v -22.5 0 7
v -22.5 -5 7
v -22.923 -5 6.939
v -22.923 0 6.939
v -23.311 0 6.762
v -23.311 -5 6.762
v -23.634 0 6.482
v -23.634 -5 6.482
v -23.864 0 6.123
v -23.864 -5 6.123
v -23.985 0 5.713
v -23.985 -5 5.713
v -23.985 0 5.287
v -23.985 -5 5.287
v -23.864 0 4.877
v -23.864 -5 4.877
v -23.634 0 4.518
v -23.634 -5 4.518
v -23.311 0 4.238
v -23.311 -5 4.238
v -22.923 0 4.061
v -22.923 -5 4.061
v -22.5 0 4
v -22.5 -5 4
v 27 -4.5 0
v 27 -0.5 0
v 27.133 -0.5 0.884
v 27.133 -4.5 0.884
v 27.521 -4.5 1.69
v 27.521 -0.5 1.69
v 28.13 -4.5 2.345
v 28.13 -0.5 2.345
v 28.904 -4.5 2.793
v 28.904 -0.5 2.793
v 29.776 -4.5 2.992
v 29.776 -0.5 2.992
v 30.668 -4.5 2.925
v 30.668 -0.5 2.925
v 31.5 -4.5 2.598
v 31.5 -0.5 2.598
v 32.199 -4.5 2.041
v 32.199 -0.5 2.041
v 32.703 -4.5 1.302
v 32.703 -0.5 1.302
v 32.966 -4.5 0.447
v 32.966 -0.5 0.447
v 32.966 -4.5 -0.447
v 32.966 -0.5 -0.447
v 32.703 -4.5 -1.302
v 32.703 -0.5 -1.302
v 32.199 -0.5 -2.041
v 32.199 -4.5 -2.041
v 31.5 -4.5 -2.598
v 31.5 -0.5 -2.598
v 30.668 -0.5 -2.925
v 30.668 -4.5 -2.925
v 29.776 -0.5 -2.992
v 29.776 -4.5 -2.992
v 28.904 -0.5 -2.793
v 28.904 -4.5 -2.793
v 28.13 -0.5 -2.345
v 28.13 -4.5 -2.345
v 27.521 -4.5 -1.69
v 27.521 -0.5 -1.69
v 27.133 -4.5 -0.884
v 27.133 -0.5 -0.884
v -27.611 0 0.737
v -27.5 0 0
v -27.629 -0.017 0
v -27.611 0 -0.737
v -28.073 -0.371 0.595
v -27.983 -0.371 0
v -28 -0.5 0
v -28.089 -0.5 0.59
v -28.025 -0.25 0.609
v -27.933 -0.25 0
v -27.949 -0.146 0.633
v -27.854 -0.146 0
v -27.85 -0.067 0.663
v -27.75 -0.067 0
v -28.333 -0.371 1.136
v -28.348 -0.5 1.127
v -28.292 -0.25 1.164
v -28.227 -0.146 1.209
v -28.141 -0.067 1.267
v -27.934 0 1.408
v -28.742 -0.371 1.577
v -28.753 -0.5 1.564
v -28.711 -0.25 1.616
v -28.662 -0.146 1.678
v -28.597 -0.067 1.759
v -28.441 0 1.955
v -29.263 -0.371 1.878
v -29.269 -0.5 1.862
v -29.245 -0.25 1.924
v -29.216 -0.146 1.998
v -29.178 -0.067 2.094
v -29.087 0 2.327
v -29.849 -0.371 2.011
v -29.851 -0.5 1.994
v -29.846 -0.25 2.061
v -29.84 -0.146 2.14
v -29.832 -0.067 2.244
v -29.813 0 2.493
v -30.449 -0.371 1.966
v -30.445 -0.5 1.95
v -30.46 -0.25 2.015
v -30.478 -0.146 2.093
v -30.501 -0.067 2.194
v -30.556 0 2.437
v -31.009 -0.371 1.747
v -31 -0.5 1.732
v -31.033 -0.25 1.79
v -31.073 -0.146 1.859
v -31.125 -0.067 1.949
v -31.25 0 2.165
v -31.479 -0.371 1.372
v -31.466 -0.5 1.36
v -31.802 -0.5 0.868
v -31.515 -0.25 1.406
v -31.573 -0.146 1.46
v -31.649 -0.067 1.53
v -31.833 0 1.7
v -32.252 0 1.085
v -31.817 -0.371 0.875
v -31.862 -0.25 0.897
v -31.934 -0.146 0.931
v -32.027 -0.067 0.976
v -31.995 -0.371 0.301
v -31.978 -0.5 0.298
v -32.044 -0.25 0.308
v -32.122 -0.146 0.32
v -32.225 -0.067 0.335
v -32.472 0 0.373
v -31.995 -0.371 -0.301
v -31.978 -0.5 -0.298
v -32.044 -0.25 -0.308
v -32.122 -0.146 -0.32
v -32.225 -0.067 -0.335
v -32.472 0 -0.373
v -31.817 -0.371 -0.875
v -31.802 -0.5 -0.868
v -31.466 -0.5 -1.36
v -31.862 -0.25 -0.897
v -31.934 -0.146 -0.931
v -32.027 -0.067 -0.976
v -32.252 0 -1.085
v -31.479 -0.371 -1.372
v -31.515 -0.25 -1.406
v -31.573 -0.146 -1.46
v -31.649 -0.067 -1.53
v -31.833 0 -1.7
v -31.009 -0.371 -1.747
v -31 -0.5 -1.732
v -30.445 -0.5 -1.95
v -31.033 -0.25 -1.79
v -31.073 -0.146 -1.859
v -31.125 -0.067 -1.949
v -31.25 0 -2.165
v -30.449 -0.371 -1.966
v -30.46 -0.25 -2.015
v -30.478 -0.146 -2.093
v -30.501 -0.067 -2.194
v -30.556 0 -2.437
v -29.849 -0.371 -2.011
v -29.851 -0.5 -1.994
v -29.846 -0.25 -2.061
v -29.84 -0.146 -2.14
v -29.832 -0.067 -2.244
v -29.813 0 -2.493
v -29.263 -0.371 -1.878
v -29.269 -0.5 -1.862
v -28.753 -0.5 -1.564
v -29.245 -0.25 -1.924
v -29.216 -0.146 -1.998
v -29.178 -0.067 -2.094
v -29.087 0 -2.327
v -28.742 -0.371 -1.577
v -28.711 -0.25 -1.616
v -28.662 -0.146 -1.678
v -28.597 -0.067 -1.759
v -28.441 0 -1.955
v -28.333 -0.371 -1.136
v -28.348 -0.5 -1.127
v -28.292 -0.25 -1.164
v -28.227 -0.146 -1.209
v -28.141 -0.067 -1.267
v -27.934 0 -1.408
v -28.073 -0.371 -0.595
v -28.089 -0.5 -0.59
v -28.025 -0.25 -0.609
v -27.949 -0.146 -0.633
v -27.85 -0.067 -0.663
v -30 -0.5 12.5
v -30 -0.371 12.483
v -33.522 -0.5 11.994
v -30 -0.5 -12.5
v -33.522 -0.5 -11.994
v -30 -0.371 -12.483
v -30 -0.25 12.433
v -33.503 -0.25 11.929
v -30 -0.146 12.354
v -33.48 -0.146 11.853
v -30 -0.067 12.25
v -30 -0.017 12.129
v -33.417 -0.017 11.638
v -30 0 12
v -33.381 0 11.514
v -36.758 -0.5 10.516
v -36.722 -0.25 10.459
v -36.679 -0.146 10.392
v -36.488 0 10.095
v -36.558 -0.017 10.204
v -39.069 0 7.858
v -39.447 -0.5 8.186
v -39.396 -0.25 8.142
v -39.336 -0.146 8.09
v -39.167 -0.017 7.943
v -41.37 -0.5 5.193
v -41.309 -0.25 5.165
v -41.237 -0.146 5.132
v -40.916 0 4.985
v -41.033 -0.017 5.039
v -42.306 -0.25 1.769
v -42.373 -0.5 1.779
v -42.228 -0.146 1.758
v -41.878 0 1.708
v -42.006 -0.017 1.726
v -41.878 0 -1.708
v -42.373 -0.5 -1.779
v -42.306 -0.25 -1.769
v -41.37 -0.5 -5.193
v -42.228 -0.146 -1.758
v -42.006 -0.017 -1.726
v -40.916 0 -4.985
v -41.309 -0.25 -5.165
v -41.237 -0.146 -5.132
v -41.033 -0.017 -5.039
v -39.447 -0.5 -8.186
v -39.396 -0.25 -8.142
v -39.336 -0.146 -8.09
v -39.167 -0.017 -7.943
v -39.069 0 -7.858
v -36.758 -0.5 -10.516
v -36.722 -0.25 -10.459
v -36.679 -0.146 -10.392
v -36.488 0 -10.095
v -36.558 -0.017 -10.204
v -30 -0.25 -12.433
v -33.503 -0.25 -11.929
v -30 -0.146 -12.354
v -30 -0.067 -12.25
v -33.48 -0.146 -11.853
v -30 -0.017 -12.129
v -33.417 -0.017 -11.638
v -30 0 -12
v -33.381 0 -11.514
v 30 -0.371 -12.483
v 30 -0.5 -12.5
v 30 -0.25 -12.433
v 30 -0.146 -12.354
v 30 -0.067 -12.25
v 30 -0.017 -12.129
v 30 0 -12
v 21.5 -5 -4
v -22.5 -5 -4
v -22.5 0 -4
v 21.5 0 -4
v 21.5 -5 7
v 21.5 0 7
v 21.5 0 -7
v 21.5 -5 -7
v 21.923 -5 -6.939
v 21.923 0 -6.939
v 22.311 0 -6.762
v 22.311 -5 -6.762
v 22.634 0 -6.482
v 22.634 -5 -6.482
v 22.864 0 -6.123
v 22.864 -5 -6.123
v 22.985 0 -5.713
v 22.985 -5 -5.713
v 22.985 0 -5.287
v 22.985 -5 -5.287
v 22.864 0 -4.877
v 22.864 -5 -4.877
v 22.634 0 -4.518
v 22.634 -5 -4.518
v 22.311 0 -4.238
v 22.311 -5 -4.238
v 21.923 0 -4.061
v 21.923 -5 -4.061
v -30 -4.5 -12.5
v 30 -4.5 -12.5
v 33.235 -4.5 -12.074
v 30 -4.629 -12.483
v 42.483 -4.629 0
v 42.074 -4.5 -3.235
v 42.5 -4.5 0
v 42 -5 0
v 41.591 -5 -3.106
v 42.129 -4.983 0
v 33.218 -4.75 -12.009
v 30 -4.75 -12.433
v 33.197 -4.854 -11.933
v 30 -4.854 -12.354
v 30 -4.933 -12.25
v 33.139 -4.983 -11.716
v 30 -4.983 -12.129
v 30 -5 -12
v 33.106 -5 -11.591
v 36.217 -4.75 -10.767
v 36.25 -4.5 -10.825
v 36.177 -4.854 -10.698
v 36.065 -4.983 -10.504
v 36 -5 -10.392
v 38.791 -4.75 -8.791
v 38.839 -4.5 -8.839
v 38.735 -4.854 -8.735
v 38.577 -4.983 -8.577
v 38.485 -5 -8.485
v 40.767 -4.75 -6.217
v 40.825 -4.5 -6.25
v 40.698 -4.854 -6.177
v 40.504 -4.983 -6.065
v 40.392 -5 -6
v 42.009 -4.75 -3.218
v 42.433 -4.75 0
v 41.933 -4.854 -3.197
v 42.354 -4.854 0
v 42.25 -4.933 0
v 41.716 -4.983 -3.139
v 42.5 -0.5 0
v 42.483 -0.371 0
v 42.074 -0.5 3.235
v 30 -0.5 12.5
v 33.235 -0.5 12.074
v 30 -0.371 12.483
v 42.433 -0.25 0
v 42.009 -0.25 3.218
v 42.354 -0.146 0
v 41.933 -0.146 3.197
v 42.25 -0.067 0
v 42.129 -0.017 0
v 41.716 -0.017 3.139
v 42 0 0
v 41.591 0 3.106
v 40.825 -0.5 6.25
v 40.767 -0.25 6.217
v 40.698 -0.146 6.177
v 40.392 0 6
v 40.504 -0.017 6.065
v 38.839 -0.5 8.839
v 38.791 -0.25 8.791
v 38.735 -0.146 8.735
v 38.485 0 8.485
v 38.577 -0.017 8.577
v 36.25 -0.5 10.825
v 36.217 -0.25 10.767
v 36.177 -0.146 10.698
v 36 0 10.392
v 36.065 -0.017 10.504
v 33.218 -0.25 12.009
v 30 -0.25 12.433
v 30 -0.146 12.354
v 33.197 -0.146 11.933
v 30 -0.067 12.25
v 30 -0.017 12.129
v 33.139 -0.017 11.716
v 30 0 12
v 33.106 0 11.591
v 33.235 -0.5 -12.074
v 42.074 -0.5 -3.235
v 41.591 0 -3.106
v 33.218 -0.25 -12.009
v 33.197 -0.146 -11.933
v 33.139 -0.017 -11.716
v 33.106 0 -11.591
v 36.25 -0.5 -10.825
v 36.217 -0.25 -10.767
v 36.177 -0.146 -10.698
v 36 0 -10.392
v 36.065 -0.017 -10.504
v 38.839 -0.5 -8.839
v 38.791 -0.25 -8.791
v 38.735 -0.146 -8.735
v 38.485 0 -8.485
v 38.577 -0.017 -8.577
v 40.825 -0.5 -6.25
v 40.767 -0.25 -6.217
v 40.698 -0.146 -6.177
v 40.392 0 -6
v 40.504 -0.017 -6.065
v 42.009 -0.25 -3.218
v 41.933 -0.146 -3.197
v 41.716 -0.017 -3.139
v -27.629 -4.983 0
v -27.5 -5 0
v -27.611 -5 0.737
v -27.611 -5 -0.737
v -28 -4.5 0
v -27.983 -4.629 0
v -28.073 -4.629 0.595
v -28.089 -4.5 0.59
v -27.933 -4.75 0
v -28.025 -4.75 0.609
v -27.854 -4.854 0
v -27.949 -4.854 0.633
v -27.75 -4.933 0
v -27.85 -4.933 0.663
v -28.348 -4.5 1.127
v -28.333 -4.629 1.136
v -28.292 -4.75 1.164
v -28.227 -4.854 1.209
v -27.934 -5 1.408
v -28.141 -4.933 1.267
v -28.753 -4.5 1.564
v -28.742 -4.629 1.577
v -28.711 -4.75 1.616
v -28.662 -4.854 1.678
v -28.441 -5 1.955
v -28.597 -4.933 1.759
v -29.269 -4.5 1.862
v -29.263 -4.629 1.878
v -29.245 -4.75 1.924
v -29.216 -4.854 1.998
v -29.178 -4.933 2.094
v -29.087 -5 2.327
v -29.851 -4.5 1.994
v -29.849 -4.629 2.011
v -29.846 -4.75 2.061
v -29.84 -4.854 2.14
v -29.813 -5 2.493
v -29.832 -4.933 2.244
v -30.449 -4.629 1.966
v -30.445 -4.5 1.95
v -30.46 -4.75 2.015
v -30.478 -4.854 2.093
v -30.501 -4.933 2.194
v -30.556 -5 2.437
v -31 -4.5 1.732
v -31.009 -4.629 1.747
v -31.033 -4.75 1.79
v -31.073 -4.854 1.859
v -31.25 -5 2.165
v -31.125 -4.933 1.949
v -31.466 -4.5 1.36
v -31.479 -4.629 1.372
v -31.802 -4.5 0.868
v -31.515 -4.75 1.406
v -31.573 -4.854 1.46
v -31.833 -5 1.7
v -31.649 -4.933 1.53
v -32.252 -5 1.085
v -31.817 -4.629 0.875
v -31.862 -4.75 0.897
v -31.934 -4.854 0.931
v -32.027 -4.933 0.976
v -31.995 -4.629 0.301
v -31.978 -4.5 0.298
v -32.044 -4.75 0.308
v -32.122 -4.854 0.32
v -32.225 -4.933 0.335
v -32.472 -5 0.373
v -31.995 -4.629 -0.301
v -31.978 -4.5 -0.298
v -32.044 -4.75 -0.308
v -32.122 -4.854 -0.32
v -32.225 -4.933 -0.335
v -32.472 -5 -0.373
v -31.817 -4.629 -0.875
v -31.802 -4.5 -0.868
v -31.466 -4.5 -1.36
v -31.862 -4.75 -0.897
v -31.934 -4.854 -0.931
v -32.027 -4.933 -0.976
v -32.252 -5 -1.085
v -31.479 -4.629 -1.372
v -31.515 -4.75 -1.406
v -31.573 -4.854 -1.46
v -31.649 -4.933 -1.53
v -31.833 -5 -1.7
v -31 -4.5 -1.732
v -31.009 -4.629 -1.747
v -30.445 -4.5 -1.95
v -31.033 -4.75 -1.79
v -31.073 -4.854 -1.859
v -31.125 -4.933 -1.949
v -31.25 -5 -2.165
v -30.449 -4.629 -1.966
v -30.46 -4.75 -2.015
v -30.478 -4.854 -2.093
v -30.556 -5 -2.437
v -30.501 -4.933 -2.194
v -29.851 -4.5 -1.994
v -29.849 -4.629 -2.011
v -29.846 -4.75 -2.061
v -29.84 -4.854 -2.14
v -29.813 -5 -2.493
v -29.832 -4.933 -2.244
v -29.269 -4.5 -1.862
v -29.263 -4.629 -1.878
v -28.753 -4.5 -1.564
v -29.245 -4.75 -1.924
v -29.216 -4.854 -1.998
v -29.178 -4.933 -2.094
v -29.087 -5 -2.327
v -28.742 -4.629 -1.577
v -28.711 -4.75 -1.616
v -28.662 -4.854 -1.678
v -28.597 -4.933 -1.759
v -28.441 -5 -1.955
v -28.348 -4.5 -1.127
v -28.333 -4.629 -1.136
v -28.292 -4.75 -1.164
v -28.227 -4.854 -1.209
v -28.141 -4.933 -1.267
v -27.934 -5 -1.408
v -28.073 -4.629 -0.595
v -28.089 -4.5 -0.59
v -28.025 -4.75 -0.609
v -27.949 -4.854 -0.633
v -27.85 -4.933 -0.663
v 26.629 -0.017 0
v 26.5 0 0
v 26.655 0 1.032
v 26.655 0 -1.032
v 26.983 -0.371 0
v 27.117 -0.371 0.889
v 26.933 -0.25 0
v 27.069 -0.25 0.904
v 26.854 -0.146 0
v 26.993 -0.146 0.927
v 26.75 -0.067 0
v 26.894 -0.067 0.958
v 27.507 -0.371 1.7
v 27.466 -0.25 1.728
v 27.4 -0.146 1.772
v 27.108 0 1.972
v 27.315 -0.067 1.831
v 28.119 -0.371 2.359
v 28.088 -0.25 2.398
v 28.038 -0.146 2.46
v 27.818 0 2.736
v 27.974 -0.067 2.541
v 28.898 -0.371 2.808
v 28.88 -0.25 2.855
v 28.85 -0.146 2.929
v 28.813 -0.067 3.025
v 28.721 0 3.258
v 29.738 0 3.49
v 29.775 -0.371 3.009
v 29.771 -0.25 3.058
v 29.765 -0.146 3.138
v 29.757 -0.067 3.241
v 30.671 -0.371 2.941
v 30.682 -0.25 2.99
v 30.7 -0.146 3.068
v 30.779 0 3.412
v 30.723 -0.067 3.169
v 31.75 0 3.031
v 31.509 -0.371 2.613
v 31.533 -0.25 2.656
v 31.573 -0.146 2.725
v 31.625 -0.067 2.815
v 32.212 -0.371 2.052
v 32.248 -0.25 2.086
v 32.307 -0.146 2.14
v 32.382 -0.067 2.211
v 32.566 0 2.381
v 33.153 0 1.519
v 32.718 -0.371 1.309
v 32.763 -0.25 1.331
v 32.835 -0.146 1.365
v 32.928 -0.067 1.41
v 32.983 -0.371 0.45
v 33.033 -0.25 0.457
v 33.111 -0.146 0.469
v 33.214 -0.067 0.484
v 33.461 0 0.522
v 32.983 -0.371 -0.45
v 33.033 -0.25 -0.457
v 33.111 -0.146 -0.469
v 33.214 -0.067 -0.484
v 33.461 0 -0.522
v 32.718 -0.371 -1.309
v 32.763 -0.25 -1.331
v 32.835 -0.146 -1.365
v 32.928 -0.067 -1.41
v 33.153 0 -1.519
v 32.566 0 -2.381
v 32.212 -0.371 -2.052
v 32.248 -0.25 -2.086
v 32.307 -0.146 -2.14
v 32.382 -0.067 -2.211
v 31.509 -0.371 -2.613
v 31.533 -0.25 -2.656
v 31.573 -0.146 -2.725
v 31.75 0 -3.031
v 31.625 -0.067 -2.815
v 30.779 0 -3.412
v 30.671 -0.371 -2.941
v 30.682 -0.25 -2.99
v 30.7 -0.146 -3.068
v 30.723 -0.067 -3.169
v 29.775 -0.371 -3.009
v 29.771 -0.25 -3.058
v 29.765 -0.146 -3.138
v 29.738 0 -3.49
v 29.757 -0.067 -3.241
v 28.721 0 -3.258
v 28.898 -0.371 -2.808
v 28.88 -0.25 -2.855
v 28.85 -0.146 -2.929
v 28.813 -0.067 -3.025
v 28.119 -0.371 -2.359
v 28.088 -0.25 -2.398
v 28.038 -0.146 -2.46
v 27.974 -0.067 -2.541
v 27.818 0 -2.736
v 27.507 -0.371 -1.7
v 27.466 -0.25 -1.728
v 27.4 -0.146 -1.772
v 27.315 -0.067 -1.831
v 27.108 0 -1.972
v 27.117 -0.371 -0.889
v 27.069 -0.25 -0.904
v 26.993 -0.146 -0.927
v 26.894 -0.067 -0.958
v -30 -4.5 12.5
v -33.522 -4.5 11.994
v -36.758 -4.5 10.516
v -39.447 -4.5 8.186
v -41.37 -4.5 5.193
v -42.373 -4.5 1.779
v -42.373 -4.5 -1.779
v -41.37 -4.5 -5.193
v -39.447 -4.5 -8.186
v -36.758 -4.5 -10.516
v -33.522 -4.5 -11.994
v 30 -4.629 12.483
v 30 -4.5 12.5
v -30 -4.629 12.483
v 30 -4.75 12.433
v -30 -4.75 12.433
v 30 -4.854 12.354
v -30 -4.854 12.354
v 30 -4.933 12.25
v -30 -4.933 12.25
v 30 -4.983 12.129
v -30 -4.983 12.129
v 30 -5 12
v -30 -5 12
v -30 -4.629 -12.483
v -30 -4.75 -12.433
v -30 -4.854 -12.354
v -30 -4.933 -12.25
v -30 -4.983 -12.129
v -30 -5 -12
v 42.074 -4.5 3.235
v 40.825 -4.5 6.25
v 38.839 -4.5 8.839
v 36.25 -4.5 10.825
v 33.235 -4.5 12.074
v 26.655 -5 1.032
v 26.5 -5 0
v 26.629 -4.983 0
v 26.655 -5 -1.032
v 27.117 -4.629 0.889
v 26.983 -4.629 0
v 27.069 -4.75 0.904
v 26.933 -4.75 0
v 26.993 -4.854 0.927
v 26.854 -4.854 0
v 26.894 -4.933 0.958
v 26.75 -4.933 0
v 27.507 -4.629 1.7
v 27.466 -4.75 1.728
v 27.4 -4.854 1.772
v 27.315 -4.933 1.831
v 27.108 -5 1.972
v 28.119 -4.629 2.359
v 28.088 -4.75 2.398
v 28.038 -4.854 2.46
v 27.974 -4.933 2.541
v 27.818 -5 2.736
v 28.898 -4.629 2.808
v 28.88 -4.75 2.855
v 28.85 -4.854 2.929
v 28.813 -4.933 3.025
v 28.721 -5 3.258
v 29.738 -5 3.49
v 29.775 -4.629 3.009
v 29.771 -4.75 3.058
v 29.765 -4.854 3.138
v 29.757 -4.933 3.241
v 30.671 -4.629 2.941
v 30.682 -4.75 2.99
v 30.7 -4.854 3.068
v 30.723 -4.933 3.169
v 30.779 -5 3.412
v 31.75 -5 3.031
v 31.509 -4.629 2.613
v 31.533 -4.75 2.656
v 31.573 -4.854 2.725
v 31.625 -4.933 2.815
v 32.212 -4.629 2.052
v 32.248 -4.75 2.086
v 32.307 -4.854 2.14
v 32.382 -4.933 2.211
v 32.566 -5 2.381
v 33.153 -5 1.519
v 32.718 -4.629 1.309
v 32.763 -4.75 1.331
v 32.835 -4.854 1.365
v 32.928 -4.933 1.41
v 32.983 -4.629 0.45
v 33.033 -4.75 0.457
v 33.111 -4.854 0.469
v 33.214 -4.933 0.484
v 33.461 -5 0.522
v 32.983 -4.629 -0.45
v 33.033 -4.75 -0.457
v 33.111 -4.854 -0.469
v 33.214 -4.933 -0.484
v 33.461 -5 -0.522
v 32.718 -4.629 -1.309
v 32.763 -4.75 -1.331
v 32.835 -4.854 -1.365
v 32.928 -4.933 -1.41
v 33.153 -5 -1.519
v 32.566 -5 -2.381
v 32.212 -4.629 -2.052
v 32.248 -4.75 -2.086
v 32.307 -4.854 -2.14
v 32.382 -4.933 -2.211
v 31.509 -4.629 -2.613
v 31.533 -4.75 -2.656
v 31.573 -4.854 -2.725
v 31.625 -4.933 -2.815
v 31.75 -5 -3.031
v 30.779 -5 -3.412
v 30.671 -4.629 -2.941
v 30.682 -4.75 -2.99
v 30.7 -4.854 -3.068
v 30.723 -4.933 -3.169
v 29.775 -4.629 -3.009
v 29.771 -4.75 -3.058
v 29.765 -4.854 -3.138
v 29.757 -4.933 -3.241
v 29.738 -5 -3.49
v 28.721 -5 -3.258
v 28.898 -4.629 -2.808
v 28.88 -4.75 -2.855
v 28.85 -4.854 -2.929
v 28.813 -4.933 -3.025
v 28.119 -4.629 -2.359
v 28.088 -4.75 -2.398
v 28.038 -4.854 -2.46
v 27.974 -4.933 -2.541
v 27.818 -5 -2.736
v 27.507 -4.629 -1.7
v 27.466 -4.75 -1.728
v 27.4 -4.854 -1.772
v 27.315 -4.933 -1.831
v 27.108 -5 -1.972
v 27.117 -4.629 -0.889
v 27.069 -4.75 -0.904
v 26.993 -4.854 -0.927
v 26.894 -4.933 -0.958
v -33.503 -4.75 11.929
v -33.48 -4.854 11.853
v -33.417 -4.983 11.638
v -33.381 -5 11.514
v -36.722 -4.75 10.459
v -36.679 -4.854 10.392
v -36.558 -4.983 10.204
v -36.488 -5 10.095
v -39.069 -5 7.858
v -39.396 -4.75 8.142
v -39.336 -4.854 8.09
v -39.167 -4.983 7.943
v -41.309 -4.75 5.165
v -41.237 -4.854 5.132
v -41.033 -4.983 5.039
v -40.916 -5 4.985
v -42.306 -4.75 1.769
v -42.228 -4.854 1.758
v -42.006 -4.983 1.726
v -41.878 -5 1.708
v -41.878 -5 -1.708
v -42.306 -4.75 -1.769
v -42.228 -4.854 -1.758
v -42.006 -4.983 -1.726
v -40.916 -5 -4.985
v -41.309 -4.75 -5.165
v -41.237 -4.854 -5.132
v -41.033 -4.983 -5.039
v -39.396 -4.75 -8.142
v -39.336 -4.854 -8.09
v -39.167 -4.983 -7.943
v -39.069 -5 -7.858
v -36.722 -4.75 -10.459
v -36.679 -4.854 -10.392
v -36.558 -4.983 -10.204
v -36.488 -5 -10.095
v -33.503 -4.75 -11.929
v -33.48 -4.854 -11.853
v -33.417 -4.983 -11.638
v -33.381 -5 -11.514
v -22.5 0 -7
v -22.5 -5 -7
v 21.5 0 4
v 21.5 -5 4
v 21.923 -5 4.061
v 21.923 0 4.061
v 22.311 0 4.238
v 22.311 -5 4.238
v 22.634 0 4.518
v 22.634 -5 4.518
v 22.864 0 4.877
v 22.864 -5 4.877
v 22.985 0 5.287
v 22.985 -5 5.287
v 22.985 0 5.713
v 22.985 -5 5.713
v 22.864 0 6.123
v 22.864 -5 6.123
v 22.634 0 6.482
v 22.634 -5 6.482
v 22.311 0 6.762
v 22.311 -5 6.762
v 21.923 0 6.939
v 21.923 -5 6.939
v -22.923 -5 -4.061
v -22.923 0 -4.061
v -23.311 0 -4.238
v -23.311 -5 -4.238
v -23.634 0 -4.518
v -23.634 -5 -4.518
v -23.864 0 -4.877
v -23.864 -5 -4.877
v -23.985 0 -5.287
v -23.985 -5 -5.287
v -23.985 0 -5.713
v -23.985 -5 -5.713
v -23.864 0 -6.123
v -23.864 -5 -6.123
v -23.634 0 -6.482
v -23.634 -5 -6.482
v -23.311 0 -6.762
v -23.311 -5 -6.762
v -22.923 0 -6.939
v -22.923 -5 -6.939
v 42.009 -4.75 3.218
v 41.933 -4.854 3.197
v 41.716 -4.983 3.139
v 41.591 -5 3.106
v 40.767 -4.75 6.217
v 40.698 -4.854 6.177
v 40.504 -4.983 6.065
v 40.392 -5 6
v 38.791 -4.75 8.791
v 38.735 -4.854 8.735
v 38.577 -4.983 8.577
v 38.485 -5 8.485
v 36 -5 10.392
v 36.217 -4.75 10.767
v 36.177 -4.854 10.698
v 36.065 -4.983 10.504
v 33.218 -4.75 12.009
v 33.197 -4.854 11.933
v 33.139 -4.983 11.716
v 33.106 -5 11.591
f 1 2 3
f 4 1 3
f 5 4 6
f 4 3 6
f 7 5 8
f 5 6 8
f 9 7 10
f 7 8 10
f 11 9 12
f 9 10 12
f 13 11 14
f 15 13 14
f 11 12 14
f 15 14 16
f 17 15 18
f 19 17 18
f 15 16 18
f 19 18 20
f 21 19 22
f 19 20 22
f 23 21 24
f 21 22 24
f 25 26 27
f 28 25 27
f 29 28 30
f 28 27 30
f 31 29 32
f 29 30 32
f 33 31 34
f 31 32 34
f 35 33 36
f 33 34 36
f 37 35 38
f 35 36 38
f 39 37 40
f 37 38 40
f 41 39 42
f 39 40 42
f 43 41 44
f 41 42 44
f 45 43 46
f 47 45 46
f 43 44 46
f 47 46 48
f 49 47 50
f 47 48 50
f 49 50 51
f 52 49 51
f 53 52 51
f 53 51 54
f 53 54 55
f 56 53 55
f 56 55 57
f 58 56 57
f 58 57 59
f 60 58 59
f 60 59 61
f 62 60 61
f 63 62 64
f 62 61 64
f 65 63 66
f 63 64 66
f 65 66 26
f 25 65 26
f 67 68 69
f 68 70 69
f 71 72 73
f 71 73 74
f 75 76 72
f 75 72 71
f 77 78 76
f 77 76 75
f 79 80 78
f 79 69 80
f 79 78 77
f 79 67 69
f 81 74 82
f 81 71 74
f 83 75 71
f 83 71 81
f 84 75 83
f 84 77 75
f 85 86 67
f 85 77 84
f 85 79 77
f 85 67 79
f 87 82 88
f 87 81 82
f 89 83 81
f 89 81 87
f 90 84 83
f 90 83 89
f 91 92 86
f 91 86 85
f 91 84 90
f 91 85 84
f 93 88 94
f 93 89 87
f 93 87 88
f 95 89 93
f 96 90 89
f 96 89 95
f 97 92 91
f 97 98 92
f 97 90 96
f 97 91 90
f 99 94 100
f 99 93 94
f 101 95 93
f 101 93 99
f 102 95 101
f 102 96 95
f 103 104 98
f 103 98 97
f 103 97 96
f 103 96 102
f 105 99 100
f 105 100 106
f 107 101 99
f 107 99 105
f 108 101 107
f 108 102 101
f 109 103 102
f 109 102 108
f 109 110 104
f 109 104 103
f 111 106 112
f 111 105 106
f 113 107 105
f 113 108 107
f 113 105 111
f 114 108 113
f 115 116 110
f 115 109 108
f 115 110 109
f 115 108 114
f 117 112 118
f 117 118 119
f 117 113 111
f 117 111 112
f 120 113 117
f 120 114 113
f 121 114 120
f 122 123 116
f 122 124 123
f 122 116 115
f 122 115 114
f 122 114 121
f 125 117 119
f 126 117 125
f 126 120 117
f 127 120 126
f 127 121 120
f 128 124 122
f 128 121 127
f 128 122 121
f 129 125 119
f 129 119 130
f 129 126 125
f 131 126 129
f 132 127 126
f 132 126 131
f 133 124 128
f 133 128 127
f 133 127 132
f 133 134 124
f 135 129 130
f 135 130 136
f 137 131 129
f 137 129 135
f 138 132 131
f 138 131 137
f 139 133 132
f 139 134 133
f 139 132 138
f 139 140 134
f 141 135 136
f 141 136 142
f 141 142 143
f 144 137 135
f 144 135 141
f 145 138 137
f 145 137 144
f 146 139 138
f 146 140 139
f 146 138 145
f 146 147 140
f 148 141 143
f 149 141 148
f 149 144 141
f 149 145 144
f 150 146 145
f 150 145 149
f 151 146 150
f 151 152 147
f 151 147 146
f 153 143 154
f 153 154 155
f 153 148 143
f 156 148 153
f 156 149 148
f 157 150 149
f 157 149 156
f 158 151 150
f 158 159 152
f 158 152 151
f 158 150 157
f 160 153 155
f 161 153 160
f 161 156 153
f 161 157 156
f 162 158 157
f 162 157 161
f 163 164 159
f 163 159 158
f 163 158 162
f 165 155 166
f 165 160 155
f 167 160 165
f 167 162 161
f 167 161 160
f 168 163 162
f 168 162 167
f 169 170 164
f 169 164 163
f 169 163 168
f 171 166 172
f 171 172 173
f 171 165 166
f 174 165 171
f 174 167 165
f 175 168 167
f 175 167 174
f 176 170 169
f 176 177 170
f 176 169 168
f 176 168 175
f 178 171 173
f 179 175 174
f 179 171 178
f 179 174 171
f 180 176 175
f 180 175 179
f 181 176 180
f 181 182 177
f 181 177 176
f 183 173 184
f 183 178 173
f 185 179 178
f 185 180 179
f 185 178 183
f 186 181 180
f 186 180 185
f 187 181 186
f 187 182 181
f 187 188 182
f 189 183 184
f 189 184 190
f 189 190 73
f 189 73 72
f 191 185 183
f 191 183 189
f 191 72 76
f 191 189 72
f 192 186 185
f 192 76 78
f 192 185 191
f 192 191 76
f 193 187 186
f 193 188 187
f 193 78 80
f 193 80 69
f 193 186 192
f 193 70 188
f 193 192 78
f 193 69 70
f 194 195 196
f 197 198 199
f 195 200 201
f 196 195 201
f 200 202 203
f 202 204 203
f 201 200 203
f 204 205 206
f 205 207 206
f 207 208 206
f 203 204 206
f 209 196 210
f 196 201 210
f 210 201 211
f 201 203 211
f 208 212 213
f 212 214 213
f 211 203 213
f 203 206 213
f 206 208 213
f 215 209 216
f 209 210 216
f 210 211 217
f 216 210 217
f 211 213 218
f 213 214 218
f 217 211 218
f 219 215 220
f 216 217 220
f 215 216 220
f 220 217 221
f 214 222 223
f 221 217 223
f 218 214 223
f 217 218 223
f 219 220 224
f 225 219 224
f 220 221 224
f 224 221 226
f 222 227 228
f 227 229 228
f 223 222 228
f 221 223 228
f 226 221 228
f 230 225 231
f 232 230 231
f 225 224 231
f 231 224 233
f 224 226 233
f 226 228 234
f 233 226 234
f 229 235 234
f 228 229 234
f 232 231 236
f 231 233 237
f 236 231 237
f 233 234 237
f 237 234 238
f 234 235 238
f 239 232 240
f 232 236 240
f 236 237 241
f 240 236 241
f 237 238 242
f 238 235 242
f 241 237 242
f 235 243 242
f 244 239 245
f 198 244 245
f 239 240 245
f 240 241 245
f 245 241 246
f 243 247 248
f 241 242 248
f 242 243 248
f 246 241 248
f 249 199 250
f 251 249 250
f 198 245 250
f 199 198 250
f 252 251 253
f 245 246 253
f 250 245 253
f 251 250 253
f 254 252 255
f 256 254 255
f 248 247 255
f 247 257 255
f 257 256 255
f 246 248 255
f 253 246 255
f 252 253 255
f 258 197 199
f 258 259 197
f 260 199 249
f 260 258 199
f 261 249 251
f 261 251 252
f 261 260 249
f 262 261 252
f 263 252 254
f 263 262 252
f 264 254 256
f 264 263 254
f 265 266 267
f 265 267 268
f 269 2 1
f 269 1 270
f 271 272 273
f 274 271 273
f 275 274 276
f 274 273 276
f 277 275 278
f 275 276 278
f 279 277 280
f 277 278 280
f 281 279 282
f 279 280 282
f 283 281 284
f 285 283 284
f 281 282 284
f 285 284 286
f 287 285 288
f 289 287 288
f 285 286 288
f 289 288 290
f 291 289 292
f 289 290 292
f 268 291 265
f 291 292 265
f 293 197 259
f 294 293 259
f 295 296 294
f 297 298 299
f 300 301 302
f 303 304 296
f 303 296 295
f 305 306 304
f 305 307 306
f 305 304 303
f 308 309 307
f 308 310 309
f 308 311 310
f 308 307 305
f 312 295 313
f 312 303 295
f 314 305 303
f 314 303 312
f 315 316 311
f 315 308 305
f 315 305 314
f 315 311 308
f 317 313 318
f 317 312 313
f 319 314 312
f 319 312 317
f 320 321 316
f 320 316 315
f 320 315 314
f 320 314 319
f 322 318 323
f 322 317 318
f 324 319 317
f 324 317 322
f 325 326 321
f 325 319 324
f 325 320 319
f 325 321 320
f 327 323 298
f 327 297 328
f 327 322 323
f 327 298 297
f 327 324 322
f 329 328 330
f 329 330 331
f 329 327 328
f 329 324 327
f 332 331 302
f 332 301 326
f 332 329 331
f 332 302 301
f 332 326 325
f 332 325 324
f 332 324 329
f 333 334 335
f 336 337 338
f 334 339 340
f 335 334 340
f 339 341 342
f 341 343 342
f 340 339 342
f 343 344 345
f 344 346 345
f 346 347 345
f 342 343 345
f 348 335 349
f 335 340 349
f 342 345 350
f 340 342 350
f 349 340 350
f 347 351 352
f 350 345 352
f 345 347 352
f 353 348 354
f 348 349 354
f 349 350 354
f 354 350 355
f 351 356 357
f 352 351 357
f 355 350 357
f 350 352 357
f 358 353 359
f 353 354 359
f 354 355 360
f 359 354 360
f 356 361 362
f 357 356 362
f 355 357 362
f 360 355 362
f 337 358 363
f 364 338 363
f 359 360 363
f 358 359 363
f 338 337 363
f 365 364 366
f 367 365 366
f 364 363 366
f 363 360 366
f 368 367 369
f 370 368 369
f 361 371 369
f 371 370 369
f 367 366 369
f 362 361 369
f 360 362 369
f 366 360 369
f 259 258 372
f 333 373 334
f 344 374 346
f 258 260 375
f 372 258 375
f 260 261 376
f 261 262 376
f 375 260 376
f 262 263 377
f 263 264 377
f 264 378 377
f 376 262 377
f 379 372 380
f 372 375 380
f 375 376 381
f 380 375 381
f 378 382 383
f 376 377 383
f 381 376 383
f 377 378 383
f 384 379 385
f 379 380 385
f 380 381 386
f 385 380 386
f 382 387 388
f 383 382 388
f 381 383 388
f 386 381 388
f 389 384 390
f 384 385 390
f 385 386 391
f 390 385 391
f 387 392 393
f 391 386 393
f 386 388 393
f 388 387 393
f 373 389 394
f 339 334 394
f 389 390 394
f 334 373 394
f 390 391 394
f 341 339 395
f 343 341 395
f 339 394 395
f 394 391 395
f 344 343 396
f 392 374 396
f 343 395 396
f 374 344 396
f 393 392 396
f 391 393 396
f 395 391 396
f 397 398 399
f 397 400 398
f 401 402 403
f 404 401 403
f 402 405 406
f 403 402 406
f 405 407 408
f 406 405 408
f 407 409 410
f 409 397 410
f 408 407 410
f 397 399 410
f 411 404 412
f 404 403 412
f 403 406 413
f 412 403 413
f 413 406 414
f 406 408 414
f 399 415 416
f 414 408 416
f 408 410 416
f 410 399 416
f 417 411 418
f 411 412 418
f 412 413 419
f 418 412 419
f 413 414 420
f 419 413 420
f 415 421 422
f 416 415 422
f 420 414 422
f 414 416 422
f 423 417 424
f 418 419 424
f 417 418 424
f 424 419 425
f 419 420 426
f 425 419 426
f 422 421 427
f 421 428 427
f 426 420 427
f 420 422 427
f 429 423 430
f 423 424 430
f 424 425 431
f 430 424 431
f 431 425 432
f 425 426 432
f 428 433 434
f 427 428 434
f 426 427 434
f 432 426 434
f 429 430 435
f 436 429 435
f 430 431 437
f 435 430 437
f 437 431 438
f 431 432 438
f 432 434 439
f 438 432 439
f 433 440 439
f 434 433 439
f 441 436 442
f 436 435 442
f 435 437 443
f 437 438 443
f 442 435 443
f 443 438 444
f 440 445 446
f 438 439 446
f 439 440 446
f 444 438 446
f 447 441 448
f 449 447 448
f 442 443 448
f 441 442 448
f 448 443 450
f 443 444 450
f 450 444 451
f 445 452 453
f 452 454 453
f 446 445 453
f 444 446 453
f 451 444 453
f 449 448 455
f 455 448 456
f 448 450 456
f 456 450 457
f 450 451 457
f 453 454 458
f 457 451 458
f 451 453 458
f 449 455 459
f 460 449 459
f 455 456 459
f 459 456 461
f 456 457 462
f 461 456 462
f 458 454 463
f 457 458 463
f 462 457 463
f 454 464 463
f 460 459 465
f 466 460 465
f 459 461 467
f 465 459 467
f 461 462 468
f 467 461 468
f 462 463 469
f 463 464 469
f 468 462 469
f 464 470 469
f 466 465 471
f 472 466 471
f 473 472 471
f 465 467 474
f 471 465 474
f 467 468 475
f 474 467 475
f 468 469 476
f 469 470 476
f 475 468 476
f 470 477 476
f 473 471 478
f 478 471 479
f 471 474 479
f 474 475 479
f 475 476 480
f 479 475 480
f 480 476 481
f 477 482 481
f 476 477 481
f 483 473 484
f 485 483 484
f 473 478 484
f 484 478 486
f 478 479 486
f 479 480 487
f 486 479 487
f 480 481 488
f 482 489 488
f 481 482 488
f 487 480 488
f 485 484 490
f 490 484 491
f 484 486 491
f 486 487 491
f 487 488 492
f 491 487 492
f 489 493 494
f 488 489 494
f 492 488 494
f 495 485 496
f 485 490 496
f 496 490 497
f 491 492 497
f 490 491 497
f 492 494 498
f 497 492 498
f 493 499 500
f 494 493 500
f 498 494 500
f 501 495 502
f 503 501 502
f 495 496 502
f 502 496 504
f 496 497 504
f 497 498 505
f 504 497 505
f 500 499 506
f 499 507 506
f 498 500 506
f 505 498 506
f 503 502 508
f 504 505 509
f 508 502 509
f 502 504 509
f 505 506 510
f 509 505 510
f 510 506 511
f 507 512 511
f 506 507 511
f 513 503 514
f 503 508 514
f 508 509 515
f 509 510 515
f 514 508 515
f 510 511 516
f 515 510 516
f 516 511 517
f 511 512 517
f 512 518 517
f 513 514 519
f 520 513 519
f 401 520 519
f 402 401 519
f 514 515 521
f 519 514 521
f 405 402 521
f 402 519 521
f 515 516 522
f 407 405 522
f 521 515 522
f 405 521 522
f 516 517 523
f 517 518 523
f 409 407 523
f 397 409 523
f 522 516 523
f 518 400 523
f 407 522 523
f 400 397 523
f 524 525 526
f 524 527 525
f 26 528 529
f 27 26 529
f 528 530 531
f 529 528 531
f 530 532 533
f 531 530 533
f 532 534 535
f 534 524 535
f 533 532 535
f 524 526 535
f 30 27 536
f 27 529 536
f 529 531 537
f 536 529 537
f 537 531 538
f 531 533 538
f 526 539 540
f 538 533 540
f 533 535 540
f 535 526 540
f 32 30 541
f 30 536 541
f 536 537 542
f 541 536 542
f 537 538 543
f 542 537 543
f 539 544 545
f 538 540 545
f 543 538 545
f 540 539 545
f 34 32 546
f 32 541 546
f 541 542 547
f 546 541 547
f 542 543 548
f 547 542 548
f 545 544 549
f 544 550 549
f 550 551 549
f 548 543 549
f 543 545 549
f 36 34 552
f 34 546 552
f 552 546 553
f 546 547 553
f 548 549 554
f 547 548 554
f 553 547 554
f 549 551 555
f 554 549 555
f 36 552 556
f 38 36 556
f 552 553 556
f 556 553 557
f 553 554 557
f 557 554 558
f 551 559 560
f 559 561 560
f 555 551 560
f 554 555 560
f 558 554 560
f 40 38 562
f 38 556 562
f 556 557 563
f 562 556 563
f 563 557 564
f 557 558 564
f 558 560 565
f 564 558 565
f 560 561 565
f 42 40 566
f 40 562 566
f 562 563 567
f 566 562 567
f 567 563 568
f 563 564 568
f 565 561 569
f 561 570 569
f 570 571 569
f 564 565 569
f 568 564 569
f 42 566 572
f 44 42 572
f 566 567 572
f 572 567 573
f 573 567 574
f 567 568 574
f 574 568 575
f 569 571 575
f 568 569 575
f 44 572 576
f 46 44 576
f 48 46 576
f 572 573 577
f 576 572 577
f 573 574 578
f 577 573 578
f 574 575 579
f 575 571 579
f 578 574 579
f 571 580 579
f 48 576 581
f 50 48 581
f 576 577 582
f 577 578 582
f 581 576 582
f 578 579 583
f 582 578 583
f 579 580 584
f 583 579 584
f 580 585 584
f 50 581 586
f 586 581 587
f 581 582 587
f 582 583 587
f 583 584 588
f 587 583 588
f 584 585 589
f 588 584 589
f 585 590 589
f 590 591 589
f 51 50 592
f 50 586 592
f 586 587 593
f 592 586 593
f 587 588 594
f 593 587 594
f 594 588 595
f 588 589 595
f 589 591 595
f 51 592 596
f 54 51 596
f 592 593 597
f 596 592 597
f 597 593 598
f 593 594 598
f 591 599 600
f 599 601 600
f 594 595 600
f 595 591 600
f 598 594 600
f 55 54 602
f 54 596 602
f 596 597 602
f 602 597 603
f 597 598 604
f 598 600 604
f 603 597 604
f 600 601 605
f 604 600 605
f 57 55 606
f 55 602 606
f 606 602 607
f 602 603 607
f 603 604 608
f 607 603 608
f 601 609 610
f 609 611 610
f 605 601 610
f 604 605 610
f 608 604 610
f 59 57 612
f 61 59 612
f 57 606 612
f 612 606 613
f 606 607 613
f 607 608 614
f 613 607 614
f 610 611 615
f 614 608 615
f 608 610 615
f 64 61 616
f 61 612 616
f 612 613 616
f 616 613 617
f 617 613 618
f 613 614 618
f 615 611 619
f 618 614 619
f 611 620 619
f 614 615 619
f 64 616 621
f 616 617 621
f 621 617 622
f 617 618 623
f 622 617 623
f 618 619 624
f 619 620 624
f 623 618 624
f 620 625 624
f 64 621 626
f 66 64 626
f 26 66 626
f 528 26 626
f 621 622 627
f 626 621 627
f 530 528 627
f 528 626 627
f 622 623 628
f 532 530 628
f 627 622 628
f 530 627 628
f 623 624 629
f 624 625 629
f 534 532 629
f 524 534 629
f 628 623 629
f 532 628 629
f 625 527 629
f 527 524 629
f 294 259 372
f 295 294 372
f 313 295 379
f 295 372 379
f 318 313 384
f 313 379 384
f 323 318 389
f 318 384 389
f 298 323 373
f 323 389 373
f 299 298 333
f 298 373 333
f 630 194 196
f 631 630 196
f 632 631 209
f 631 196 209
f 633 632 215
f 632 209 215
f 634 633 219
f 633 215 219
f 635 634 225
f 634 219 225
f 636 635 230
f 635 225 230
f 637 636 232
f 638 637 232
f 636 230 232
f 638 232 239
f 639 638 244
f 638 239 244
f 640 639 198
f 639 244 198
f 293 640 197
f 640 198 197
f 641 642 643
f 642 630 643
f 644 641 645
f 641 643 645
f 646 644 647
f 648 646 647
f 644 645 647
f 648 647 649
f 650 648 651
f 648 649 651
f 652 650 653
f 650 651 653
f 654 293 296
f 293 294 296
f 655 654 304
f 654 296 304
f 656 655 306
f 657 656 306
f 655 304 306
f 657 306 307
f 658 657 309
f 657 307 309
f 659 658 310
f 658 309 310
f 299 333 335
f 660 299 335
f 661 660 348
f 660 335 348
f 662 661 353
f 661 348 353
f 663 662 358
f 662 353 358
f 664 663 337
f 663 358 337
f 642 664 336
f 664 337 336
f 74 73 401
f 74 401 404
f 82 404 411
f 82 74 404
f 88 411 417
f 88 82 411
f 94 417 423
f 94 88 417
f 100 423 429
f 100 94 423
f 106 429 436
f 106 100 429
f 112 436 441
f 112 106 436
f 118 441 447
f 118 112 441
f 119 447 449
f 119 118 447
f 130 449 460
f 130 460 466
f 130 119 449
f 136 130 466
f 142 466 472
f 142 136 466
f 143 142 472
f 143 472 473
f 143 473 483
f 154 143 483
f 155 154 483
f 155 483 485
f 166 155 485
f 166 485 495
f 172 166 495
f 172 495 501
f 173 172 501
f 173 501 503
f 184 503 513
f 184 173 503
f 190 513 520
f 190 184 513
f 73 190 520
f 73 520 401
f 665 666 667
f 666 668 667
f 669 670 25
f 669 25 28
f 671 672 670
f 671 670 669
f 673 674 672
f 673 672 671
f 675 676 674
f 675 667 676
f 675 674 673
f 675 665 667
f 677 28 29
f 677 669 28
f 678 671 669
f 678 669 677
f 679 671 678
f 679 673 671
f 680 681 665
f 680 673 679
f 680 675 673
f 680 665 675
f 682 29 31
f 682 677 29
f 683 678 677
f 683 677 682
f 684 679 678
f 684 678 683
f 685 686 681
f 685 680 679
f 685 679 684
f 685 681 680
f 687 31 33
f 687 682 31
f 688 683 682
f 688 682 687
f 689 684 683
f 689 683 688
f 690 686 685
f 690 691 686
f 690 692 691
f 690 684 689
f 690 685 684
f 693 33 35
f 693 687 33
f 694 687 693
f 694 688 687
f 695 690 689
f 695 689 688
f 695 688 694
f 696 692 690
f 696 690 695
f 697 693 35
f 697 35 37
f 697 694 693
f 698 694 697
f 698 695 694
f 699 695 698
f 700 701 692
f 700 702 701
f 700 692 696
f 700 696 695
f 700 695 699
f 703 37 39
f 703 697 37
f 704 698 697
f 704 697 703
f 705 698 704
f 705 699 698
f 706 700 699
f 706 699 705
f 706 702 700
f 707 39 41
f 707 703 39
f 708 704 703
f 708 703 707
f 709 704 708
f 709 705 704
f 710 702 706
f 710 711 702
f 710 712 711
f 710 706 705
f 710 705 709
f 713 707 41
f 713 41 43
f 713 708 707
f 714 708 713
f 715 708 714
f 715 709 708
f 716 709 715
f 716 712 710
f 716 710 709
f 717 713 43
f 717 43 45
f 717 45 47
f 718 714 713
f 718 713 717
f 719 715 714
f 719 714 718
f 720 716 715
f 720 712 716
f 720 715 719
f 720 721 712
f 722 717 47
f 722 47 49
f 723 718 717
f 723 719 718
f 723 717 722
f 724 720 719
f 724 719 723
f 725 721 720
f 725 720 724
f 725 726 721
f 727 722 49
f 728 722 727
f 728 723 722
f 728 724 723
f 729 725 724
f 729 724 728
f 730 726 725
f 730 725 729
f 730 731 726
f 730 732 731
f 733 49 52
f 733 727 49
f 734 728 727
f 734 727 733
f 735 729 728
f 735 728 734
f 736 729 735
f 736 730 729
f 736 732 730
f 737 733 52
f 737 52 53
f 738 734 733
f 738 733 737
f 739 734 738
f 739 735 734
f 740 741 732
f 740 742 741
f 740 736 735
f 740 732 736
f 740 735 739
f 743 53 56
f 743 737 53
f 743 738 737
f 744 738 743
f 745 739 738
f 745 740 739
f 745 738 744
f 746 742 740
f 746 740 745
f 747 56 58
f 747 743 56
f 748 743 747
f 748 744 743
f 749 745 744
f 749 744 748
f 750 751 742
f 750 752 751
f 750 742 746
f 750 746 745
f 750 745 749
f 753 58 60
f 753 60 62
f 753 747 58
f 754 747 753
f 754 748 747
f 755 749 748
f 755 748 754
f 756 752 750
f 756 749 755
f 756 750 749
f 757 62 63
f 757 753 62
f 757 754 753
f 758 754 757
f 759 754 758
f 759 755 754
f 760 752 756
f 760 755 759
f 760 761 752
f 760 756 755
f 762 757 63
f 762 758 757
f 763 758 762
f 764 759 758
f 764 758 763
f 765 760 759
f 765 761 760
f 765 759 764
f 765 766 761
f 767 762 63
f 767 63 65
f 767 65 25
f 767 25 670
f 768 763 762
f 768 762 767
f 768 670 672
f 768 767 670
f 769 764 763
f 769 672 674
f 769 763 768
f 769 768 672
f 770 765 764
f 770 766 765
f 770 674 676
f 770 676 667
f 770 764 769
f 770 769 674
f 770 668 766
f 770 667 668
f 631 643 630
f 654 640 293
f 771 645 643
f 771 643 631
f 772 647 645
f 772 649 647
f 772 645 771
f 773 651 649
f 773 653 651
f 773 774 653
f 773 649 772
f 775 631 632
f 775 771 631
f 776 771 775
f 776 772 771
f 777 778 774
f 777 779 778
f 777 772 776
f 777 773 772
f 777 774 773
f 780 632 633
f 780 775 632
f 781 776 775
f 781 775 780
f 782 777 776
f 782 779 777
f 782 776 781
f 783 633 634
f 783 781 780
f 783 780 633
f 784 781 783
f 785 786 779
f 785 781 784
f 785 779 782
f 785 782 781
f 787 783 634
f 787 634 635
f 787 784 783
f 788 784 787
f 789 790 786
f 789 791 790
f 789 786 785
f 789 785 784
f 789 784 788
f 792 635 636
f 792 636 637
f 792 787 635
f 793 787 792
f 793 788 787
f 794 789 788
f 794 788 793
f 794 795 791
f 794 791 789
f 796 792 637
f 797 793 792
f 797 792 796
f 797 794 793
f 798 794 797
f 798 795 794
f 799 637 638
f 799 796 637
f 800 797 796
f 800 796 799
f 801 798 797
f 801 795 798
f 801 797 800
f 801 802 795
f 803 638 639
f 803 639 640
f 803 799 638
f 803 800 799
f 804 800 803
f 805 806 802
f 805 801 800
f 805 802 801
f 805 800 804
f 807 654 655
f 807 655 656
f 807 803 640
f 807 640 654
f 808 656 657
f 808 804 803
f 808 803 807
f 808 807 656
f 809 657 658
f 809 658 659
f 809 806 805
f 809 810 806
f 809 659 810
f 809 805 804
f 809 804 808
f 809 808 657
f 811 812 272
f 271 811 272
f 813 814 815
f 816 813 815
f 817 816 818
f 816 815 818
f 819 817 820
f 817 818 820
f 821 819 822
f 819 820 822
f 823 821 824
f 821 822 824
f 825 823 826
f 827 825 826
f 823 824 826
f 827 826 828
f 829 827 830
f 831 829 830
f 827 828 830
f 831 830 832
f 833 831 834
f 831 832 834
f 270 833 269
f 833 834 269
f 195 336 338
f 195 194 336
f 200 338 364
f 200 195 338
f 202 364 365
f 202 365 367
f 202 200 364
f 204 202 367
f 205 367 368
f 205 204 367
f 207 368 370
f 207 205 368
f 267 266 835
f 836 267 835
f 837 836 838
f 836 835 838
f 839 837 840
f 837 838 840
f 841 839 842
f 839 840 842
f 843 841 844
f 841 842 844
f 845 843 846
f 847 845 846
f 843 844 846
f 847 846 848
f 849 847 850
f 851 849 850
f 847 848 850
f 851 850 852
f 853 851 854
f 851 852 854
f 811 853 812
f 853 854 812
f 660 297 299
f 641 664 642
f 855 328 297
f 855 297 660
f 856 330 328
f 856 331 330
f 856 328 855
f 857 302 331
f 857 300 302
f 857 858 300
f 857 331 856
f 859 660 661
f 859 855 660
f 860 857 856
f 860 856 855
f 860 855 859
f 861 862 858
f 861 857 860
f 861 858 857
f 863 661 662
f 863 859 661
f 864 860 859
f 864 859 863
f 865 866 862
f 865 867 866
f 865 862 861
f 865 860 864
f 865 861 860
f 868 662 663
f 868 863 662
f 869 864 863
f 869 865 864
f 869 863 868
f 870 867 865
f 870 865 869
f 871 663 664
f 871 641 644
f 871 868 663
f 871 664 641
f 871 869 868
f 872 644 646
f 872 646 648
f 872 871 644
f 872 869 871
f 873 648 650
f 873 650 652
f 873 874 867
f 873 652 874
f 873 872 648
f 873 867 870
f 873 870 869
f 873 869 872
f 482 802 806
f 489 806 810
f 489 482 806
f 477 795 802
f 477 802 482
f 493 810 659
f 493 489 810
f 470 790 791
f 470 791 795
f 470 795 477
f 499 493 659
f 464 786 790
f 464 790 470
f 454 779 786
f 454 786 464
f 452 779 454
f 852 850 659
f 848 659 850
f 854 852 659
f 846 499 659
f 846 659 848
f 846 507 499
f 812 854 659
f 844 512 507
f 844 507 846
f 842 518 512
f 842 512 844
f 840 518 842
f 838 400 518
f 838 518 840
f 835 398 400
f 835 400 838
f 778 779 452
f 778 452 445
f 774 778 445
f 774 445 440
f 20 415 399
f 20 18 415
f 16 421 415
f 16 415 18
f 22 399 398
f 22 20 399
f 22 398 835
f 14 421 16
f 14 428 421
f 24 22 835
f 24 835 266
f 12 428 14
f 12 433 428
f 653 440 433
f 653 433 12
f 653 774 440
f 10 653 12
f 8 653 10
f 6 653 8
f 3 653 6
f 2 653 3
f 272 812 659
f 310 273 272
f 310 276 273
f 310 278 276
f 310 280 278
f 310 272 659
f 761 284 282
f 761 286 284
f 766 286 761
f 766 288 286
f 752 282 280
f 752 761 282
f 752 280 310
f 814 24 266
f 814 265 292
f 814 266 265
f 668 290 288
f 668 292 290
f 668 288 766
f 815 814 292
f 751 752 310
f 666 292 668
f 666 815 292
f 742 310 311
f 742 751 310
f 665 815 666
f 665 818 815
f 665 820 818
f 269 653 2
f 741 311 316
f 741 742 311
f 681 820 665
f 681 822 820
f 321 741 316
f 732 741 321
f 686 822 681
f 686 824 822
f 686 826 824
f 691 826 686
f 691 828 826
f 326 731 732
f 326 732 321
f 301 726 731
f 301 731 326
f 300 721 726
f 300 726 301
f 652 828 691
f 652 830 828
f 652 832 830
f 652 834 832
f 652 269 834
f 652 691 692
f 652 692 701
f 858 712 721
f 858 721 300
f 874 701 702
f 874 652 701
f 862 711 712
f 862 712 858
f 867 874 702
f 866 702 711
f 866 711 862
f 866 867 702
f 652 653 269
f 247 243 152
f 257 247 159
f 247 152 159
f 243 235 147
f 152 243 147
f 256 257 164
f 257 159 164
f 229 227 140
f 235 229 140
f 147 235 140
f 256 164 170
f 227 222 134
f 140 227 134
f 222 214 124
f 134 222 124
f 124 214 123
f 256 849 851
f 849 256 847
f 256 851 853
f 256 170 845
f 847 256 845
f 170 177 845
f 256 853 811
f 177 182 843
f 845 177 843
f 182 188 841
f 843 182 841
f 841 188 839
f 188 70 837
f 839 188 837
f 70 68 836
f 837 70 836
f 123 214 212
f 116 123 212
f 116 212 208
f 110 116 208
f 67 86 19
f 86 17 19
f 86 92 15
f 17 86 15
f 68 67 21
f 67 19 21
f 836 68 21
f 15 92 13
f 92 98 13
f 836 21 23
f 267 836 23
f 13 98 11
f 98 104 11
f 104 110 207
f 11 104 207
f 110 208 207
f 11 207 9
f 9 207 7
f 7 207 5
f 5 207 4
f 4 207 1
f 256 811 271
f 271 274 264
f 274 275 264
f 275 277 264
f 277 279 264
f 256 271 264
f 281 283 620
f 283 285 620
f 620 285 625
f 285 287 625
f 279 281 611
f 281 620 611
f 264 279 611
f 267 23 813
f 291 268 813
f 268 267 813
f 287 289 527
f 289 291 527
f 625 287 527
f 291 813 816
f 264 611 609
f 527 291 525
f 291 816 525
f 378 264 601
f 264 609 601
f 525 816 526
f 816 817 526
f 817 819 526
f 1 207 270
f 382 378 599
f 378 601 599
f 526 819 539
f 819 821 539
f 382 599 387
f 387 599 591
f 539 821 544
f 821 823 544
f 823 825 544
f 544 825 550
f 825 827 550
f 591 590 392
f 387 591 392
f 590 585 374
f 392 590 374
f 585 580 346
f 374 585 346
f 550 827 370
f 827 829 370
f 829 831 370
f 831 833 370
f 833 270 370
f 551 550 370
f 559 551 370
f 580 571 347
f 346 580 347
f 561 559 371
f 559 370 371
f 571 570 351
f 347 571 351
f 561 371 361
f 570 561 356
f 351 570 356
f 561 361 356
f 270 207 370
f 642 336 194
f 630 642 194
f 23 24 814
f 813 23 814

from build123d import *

# Parameters (mm, degrees)
F0_R     = 2
F1_DEPTH = 5
F2_R     = 0.5
F3_W     = 44
F3_H     = 3
F4_DEPTH = 5.001


with BuildPart() as f1:
    # F0 (on Front) → F1 (new body)
    with BuildSketch(Plane.XZ):
        with BuildLine():
            Line((-17.5, 0), (0, 0))
            Line((0, 0), (17.5, 0))
            ThreePointArc((17.5, 0), (21.161165, 8.838835), (30, 12.5))
            Line((30, 12.5), (-30, 12.5))
            ThreePointArc((-30, 12.5), (-21.161165, 8.838835), (-17.5, 0))
        make_face()
        with BuildLine():
            Line((17.5, 0), (0, 0))
            Line((0, 0), (-17.5, 0))
            ThreePointArc((-17.5, 0), (-21.161165, -8.838835), (-30, -12.5))
            Line((-30, -12.5), (30, -12.5))
            ThreePointArc((30, -12.5), (21.161165, -8.838835), (17.5, 0))
        make_face()
        with BuildLine():
            ThreePointArc((30, 12.5), (21.161165, 8.838835), (17.5, 0))
            ThreePointArc((17.5, 0), (21.161165, -8.838835), (30, -12.5))
            ThreePointArc((30, -12.5), (38.838835, -8.838835), (42.5, 0))
            ThreePointArc((42.5, 0), (38.838835, 8.838835), (30, 12.5))
        make_face()
        with BuildLine():
            ThreePointArc((33, 0), (30, -3), (27, 0))
            ThreePointArc((27, 0), (30, 3), (33, 0))
        make_face(mode=Mode.SUBTRACT)
        with BuildLine():
            ThreePointArc((-30, -12.5), (-21.161165, -8.838835), (-17.5, 0))
            ThreePointArc((-17.5, 0), (-21.161165, 8.838835), (-30, 12.5))
            ThreePointArc((-30, 12.5), (-42.5, 0), (-30, -12.5))
        make_face()
        with Locations((-30, 0)):
            Circle(F0_R, mode=Mode.SUBTRACT)
    extrude(amount=F1_DEPTH)

    # F2
    f2_edges = [f1.edges().sort_by_distance(p)[0] for p in [
        (0, -5, 12.5),
        (-42.5, -5, 0),
        (0, -5, -12.5),
        (42.5, -5, 0),
        (33, -5, 0),
        (-32, -5, 0),
        (0, 0, 12.5),
        (-42.5, 0, 0),
        (0, 0, -12.5),
        (42.5, 0, 0),
        (33, 0, 0),
        (-32, 0, 0),
    ]]
    fillet(f2_edges, radius=F2_R)

    # F3 (on face) → F4 (cut, through all)
    with BuildSketch(Plane.XZ.offset(5)):
        with Locations((-0.5, 5.5)):
            Rectangle(F3_W, F3_H)
        with BuildLine():
            Line((-22.5, 4), (-22.5, 7))
            ThreePointArc((-22.5, 7), (-24, 5.5), (-22.5, 4))
        make_face()
        with BuildLine():
            ThreePointArc((21.5, 4), (23, 5.5), (21.5, 7))
            Line((21.5, 7), (21.5, 4))
        make_face()
        with BuildLine():
            ThreePointArc((21.5, -7), (23, -5.5), (21.5, -4))
            Line((21.5, -4), (21.5, -7))
        make_face()
        with Locations((-0.5, -5.5)):
            Rectangle(F3_W, F3_H)
        with BuildLine():
            Line((-22.5, -7), (-22.5, -4))
            ThreePointArc((-22.5, -4), (-24, -5.5), (-22.5, -7))
        make_face()
    extrude(amount=-F4_DEPTH, mode=Mode.SUBTRACT)


solid = f1.part
